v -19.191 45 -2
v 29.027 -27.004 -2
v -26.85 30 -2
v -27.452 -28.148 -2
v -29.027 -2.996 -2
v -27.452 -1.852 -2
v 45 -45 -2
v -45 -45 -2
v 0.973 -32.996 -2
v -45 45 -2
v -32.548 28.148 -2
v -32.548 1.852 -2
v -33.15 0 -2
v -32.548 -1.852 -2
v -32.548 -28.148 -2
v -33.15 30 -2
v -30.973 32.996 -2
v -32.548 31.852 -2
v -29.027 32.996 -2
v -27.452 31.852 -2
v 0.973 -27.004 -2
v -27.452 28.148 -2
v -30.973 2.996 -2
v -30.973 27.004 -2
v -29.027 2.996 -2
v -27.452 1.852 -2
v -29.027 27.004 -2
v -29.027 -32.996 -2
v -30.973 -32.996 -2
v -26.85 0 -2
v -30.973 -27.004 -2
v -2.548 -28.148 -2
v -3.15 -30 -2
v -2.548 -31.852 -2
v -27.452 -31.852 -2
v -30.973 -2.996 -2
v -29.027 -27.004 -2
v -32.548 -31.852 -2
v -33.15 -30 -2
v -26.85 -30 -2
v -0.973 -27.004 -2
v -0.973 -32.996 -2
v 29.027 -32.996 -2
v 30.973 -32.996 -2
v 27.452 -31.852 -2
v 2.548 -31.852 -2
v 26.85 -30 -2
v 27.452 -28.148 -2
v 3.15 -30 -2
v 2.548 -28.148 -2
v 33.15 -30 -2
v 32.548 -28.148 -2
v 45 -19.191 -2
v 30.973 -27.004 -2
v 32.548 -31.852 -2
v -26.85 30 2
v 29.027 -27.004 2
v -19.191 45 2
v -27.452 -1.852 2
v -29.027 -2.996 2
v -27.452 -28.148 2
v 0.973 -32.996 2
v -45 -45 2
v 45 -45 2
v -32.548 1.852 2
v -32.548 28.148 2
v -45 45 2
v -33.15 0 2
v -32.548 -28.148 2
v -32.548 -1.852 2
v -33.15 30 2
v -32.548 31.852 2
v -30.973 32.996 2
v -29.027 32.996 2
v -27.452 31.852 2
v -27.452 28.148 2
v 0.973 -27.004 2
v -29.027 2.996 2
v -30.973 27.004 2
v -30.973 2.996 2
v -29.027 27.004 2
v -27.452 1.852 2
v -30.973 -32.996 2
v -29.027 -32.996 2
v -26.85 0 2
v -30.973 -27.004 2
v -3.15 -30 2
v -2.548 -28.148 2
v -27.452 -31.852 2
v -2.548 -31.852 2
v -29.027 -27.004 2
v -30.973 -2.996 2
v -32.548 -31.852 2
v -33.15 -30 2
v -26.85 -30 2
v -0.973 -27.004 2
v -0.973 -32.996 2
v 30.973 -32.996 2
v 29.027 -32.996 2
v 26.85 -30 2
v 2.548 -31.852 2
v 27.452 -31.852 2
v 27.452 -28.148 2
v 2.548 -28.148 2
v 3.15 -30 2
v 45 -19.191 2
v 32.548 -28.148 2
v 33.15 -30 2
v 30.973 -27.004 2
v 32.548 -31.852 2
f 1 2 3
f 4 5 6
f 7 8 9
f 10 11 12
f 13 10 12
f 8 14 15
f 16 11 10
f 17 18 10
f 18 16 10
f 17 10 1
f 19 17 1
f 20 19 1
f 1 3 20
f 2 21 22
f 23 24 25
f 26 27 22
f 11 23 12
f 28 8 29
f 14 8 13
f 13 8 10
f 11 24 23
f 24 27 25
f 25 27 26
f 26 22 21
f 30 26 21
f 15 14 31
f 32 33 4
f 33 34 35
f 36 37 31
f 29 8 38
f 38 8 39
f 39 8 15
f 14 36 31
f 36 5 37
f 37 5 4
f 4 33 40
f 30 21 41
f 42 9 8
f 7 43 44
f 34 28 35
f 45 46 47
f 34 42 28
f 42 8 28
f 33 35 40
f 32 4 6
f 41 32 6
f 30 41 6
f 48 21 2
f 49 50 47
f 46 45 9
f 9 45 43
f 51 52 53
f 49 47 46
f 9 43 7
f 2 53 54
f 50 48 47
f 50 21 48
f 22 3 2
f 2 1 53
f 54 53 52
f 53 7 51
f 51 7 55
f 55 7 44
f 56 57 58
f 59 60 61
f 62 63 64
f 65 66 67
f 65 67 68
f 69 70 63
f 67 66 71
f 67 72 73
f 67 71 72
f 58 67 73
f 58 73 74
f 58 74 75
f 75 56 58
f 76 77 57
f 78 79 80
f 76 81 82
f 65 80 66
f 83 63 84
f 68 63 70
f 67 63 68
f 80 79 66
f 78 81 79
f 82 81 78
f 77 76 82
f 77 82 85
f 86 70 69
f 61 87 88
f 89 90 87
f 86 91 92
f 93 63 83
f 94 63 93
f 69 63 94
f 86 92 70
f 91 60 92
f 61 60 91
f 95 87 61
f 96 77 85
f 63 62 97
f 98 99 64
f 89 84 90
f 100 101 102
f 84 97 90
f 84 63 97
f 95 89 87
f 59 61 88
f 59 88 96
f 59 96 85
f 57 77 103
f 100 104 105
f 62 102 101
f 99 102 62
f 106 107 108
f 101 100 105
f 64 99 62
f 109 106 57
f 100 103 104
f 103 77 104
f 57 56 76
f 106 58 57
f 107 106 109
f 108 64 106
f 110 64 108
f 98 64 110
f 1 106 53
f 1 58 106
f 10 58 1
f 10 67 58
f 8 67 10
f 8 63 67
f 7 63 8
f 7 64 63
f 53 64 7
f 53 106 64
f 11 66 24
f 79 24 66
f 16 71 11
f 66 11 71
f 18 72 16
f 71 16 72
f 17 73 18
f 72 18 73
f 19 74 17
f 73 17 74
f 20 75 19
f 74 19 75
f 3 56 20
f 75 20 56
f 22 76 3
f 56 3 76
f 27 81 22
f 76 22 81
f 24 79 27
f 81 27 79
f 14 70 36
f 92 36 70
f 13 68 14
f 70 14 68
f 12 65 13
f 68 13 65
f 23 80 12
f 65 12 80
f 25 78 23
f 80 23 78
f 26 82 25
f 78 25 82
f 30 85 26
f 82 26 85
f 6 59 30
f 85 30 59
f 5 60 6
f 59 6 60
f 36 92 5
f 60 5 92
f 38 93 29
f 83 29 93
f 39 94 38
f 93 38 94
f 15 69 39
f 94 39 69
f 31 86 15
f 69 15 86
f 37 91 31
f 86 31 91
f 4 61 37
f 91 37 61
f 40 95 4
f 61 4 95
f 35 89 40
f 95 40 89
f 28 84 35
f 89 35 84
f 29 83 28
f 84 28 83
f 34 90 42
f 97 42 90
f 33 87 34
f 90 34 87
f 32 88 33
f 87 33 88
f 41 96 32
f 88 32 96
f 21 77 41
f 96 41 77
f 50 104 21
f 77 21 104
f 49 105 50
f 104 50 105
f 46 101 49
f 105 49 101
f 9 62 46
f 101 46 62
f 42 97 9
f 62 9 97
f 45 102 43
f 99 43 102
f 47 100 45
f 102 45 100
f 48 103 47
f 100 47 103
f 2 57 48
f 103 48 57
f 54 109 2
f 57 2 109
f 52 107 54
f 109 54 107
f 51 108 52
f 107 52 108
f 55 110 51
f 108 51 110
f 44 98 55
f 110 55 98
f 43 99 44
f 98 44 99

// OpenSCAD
inch = 25.4;

module JoiningPlate30_4351() {
	translate([0,0,-2])
	linear_extrude(height=4)
	difference() {
		square(90, center=true);
		translate([1.9*inch, 1.9*inch,0]) rotate(45) square(100, center=true);
		translate([-30,0,0]) circle(d=6.3);
		translate([-30,30,0]) circle(d=6.3);
		translate([-30,-30,0]) circle(d=6.3);
		translate([0,-30,0]) circle(d=6.3);
		translate([30,-30,0]) circle(d=6.3);
	}
}

JoiningPlate30_4351();
